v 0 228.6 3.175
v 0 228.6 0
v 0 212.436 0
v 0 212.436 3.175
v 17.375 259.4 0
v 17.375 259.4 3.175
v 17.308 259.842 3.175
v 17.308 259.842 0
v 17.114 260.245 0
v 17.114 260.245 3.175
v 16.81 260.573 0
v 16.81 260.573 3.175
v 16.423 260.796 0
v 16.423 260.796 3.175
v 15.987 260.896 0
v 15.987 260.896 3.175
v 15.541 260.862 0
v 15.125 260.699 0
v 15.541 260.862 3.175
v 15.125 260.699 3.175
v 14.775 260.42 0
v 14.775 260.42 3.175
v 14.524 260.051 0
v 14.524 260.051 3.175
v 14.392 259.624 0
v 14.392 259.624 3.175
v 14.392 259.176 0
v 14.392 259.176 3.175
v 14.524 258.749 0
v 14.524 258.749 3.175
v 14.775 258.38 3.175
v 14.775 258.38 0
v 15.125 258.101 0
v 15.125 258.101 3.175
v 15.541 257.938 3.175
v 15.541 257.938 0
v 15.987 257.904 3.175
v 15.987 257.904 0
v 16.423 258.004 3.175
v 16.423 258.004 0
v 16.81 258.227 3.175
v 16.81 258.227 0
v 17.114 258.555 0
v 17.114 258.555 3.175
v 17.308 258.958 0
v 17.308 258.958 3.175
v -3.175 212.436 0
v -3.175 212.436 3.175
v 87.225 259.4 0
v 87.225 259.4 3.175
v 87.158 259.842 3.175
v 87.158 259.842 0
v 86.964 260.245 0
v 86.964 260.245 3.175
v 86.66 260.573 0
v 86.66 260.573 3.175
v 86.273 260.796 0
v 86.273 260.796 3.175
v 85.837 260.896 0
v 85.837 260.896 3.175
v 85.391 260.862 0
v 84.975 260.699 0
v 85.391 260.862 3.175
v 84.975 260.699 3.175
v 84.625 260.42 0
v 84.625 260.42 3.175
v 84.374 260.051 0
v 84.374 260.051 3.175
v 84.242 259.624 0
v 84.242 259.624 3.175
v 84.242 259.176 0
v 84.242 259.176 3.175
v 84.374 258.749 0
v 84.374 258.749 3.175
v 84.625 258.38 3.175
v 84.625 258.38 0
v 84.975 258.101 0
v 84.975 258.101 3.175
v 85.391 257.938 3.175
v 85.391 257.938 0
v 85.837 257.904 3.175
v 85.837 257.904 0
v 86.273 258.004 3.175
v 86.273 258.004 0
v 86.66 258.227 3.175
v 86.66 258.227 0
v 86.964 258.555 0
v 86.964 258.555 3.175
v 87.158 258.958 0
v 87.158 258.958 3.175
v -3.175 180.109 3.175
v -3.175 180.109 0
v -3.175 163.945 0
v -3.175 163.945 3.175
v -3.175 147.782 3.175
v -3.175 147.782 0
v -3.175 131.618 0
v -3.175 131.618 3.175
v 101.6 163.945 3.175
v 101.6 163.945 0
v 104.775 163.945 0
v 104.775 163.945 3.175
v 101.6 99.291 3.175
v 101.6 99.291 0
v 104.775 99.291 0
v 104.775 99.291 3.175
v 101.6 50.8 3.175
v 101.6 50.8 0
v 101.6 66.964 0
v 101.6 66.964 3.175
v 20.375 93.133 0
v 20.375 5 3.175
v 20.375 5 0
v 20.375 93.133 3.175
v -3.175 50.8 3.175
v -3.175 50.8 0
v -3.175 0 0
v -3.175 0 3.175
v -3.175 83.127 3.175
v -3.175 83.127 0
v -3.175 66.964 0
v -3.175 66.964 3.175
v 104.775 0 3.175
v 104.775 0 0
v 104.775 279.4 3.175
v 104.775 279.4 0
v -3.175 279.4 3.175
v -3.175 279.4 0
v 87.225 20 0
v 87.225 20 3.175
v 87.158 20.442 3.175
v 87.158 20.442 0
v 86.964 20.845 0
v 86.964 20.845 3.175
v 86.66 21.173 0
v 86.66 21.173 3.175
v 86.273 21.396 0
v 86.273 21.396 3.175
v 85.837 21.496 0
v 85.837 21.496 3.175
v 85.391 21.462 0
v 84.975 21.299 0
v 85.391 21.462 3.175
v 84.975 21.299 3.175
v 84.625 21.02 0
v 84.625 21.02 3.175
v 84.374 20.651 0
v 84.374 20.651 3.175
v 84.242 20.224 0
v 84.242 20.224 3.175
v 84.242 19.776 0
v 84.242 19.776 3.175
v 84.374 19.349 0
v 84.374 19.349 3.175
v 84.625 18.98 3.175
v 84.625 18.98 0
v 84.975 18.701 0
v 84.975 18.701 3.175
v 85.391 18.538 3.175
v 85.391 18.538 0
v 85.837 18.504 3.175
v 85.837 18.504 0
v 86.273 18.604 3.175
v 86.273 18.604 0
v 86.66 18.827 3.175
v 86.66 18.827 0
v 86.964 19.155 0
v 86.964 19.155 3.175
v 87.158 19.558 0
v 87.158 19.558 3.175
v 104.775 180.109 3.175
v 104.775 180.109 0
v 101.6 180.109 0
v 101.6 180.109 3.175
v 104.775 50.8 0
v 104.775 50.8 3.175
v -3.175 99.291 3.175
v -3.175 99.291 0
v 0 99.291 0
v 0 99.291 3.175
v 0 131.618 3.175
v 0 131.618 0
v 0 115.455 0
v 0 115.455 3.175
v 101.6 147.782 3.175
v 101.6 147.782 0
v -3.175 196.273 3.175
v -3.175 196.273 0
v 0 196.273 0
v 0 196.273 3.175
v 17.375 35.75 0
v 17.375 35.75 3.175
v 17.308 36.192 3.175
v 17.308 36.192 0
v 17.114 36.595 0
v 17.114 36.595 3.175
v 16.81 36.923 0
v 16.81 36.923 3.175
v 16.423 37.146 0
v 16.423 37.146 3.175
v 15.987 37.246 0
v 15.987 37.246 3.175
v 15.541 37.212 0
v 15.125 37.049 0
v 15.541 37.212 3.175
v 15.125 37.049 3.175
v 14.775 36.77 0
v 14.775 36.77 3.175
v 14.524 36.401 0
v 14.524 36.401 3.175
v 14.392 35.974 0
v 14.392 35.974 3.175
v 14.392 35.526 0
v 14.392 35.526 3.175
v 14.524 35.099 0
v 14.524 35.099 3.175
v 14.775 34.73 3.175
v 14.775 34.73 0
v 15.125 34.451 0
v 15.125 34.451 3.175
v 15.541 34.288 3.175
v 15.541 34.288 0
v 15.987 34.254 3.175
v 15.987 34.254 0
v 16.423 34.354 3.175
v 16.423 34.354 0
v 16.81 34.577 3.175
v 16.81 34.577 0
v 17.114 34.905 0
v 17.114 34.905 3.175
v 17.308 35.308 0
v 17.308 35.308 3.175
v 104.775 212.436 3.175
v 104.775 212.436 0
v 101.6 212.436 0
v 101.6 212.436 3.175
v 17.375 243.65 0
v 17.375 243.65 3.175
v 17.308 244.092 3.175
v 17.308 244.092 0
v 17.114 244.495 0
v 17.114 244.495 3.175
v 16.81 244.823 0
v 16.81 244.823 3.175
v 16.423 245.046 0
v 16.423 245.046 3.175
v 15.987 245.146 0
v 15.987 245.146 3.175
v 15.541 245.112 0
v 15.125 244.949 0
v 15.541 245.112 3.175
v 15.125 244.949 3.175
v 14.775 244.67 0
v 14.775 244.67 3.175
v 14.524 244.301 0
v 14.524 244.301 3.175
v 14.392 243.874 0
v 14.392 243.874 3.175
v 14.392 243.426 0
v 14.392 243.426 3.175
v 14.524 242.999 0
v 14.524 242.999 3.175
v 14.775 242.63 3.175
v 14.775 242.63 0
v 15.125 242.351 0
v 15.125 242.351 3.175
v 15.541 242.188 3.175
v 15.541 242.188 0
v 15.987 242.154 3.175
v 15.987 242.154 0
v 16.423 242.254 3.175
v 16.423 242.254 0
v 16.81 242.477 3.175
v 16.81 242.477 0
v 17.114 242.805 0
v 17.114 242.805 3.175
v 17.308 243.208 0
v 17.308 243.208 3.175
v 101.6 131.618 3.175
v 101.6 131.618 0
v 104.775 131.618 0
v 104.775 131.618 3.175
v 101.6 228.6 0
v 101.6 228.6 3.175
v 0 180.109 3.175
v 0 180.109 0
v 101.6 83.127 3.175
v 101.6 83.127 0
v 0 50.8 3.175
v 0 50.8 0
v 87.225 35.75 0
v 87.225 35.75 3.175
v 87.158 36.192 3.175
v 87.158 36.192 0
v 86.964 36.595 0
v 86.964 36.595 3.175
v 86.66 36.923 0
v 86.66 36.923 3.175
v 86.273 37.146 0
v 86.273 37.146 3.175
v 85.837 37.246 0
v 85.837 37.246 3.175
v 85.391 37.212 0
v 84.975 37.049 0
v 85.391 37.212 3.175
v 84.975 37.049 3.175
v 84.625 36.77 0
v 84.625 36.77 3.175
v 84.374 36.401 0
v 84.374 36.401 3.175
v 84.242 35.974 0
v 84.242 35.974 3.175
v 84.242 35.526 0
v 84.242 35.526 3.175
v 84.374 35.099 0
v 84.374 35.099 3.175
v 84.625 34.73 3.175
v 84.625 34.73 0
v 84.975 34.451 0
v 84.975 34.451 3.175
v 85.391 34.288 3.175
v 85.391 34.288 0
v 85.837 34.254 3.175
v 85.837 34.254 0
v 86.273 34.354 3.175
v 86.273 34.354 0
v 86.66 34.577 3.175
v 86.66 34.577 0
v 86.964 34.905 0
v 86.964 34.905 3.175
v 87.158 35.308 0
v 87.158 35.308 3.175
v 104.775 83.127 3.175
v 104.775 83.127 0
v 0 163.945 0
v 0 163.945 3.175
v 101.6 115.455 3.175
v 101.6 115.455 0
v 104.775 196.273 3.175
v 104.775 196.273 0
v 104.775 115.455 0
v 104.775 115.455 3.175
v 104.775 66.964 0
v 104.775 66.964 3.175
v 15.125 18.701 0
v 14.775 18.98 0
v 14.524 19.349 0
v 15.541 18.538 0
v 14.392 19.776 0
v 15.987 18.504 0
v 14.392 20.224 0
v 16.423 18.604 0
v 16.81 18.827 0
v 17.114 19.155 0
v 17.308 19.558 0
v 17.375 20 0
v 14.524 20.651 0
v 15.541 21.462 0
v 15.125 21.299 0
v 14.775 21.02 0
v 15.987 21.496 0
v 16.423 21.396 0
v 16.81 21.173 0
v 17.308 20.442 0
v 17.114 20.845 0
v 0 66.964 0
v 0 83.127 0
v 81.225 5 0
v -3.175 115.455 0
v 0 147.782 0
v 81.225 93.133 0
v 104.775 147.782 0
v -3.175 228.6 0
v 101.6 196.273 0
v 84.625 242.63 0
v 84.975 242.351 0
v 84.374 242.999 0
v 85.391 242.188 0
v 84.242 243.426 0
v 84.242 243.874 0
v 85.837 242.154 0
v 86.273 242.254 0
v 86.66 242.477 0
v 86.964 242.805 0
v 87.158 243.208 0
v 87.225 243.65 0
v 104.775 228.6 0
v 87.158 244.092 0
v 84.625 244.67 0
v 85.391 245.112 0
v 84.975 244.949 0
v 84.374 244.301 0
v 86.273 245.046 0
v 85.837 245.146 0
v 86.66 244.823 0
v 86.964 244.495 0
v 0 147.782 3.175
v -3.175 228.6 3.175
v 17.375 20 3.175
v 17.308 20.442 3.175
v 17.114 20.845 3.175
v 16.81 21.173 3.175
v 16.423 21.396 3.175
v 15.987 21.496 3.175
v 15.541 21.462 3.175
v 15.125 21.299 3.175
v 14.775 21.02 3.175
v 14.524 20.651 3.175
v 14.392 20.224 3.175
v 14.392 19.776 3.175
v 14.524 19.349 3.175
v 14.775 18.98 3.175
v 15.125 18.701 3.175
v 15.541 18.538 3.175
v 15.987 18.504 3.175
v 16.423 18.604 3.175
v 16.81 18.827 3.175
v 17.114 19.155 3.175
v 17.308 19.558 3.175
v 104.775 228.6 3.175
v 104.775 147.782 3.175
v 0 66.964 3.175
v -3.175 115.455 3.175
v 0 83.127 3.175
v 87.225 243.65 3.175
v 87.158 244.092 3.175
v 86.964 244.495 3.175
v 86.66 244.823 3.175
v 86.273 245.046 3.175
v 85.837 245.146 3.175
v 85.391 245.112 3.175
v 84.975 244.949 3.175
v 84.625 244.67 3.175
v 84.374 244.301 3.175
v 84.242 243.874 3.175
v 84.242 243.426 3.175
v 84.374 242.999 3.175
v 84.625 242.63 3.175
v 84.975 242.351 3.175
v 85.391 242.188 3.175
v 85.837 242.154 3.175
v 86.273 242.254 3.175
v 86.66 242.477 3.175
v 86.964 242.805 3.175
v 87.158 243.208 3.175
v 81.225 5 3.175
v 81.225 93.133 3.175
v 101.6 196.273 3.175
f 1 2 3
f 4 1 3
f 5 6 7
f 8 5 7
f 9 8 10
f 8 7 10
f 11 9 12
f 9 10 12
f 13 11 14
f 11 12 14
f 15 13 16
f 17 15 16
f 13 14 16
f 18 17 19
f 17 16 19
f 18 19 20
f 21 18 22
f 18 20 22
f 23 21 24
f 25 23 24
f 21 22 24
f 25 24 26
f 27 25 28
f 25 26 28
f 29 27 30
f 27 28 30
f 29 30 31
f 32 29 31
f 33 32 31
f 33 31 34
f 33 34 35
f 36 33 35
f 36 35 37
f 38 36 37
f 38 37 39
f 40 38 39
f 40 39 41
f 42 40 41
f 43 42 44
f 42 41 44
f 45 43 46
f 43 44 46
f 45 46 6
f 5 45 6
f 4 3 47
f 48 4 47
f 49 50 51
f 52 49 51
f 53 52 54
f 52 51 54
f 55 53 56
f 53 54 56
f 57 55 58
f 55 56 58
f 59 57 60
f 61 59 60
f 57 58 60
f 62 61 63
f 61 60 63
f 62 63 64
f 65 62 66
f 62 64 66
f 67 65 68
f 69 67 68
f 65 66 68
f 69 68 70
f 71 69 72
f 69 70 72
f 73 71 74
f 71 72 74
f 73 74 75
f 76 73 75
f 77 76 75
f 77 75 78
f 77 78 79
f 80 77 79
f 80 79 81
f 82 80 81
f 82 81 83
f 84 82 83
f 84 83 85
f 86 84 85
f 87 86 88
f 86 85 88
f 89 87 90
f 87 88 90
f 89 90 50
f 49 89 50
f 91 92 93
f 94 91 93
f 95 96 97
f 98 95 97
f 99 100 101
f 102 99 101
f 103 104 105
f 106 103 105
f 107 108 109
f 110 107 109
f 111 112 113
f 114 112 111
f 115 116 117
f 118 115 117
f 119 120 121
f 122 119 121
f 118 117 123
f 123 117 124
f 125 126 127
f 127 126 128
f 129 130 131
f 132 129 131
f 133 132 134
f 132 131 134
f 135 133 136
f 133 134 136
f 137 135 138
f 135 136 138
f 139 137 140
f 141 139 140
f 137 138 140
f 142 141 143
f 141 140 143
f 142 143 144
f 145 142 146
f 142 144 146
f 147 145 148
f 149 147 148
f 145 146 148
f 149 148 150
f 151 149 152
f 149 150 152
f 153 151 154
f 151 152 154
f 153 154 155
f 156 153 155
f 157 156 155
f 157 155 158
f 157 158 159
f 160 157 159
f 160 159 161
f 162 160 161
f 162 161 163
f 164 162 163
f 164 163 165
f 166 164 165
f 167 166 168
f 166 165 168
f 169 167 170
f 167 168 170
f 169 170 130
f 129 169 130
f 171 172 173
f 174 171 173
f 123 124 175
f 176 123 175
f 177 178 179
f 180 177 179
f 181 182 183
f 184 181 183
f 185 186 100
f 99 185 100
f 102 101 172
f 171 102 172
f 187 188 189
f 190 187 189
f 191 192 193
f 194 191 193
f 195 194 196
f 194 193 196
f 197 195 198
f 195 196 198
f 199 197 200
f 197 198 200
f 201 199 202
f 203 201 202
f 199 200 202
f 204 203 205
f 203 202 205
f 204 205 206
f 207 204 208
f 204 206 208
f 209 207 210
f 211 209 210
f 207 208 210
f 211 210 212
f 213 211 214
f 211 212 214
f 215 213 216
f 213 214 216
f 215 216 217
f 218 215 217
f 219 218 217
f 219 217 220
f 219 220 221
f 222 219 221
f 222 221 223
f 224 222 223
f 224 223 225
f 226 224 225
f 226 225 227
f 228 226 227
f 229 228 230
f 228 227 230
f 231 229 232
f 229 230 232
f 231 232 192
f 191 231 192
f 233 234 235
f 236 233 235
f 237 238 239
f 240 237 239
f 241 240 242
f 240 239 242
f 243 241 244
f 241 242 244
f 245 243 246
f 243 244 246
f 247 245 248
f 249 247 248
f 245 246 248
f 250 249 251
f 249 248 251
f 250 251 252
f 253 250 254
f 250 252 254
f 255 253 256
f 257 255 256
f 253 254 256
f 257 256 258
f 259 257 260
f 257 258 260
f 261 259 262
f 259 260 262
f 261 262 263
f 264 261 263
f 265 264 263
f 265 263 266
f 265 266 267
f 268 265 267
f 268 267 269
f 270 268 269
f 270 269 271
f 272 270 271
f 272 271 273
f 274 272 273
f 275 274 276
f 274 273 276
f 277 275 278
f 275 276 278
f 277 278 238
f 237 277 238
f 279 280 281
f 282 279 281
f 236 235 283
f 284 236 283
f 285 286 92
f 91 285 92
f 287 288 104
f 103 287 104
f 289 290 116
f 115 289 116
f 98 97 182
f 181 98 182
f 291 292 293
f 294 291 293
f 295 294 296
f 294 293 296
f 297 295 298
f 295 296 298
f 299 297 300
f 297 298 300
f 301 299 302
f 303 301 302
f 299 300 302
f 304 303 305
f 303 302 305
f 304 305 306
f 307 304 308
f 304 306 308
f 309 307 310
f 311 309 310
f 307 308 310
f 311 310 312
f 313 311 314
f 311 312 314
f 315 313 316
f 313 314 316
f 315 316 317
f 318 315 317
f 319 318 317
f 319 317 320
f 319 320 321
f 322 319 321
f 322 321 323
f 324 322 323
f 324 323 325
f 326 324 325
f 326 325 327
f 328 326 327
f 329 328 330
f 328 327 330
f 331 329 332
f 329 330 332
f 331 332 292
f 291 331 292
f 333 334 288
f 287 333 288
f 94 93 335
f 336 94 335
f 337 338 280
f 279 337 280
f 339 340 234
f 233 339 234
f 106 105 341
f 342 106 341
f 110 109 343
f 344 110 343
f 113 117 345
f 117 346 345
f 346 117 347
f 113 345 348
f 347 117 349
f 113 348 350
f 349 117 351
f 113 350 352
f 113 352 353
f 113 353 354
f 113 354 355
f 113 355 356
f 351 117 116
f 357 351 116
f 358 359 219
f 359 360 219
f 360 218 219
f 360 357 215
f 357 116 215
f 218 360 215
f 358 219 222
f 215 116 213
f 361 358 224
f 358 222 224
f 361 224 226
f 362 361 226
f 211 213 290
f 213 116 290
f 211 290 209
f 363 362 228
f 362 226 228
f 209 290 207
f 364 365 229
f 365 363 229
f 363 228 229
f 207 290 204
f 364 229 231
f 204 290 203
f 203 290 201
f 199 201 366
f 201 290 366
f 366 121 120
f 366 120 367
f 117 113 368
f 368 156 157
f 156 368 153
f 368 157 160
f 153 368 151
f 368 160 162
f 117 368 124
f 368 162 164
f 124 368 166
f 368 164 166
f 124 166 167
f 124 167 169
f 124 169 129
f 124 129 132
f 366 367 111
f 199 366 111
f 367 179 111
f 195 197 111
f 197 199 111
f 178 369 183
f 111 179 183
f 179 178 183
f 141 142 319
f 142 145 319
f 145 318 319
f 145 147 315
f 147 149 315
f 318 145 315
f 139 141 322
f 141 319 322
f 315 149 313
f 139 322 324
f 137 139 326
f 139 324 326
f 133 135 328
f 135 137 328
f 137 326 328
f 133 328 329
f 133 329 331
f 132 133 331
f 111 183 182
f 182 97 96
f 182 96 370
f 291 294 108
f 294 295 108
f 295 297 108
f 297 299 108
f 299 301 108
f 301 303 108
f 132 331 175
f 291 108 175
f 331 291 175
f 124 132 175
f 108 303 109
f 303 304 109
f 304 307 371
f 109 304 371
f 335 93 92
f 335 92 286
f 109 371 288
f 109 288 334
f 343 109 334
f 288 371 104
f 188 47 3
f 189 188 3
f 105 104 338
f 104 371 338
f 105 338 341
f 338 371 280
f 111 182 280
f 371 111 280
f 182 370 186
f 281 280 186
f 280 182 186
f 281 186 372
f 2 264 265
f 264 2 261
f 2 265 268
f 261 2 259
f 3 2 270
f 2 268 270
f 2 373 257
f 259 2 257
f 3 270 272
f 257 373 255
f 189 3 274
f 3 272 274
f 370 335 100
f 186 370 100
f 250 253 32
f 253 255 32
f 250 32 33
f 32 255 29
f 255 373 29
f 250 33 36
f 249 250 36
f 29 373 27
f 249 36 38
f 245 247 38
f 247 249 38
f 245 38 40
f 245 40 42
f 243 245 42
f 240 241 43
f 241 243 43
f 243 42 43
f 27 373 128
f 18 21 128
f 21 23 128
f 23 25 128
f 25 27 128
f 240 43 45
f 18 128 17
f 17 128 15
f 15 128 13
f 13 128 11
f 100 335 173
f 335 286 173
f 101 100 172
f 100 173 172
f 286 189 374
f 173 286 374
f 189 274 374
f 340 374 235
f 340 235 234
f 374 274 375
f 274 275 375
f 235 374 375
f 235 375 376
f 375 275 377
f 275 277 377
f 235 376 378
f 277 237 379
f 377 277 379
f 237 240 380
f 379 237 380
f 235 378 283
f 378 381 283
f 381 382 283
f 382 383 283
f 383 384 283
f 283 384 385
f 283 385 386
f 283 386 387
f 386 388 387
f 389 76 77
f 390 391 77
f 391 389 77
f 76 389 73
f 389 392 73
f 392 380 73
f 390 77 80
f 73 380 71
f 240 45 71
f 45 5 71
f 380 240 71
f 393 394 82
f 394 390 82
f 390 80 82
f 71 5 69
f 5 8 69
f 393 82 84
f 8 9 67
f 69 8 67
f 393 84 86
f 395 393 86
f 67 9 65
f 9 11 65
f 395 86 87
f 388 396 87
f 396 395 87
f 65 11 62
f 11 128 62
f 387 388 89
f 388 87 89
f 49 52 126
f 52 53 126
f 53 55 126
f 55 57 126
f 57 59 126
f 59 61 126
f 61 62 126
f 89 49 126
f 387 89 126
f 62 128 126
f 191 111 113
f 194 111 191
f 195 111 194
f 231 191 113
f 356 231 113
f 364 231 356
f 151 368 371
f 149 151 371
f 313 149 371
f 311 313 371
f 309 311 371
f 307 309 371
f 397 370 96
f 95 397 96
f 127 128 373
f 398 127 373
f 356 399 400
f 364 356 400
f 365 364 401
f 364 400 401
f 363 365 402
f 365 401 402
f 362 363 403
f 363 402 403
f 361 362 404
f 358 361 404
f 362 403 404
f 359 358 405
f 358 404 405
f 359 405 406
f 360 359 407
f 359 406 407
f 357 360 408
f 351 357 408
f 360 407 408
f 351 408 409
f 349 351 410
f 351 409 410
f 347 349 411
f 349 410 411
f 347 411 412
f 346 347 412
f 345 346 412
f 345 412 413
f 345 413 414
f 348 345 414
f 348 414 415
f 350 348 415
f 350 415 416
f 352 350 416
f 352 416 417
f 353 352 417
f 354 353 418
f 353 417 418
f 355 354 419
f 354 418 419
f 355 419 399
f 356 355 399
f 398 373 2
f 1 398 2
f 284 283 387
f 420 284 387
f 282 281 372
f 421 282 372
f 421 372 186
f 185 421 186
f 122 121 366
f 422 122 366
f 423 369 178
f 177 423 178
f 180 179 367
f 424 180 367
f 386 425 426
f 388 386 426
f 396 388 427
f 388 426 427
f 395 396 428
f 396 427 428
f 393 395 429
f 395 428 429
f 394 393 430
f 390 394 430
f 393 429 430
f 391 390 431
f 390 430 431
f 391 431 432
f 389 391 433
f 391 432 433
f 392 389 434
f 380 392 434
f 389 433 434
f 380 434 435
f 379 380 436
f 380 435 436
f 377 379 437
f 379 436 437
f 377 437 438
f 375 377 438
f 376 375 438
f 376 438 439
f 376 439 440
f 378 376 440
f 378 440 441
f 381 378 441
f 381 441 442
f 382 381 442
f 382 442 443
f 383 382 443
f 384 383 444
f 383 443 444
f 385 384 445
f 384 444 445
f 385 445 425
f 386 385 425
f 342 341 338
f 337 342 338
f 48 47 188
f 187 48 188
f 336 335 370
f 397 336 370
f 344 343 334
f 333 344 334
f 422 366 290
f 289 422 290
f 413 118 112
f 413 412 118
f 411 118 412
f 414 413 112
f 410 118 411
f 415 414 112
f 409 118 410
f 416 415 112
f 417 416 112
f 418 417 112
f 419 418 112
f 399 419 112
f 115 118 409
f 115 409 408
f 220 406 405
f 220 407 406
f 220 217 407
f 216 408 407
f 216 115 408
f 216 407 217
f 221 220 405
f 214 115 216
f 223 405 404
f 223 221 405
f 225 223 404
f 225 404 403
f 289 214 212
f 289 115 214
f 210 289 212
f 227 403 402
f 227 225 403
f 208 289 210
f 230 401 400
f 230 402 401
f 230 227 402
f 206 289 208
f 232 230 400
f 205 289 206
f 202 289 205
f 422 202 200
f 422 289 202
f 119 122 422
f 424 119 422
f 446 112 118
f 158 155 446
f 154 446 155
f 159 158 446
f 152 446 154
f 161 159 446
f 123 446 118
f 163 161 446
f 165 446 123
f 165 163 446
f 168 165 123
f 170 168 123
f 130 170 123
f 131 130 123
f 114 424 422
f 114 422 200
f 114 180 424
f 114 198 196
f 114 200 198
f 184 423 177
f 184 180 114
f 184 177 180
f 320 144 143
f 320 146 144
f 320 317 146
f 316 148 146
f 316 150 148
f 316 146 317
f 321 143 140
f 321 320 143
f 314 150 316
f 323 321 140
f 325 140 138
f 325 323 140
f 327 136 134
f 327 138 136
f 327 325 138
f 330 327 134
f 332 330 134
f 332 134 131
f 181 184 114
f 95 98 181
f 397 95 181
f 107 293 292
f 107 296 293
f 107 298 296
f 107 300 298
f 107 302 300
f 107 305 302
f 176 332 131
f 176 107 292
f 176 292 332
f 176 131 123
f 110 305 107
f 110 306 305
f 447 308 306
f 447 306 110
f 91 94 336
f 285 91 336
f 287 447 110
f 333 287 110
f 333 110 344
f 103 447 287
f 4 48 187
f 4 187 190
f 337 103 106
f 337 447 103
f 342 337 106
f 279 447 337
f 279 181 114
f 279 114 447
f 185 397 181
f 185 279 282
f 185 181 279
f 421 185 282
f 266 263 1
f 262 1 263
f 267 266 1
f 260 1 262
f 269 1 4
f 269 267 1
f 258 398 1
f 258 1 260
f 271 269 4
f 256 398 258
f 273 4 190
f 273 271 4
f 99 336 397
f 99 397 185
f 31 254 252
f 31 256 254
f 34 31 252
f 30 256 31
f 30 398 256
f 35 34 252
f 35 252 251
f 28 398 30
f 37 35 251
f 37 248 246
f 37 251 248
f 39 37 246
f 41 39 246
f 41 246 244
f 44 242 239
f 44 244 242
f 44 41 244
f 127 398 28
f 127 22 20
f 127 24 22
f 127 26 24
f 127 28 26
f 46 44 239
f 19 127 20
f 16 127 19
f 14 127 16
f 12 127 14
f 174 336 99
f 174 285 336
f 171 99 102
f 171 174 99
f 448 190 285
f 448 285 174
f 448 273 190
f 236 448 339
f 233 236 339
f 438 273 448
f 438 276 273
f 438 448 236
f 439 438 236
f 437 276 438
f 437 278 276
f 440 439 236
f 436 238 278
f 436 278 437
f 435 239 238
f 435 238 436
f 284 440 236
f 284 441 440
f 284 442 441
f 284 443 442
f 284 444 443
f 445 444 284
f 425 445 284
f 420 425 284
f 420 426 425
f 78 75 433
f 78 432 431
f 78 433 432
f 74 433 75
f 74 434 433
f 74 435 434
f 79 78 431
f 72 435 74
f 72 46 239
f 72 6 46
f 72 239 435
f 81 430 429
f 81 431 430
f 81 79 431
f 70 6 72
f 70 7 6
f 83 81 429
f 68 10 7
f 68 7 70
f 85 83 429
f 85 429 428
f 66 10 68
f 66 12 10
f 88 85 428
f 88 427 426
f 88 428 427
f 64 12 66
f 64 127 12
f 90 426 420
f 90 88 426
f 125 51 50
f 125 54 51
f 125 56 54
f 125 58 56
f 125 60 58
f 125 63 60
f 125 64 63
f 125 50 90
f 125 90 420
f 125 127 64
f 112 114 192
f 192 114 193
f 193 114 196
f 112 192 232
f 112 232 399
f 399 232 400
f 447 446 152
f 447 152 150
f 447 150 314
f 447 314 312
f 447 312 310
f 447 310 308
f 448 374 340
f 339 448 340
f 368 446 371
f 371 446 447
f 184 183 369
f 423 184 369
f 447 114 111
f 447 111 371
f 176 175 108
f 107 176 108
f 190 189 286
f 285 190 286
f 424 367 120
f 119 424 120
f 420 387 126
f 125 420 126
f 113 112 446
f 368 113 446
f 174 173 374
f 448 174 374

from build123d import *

# Parameters (mm, degrees)
BOSS_EXTRUDE1_DEPTH = 3.175
SKETCH2_R           = 1.5
CUT_EXTRUDE1_DEPTH  = 3.175
SKETCH3_W           = 60.85
SKETCH3_H           = 88.133333333
CUT_EXTRUDE2_DEPTH  = 3.175


with BuildPart() as part:
    # Sketch1 → Boss-Extrude1 (new body)
    with BuildSketch(Plane.XY):
        Polygon((-3.175, 279.4), (-3.175, 228.6), (0, 228.6), (0, 212.436363636), (-3.175, 212.436363636), (-3.175, 196.272727273), (0, 196.272727273), (0, 180.109090909), (-3.175, 180.109090909), (-3.175, 163.945454545), (0, 163.945454545), (0, 147.781818182), (-3.175, 147.781818182), (-3.175, 131.618181818), (0, 131.618181818), (0, 115.454545455), (-3.175, 115.454545455), (-3.175, 99.290909091), (0, 99.290909091), (0, 83.127272727), (-3.175, 83.127272727), (-3.175, 66.963636364), (0, 66.963636364), (0, 50.8), (-3.175, 50.8), (-3.175, 0), (104.775, 0), (104.775, 50.8), (101.6, 50.8), (101.6, 66.963636364), (104.775, 66.963636364), (104.775, 83.127272727), (101.6, 83.127272727), (101.6, 99.290909091), (104.775, 99.290909091), (104.775, 115.454545455), (101.6, 115.454545455), (101.6, 131.618181818), (104.775, 131.618181818), (104.775, 147.781818182), (101.6, 147.781818182), (101.6, 163.945454545), (104.775, 163.945454545), (104.775, 180.109090909), (101.6, 180.109090909), (101.6, 196.272727273), (104.775, 196.272727273), (104.775, 212.436363636), (101.6, 212.436363636), (101.6, 228.6), (104.775, 228.6), (104.775, 279.4), align=None)
    extrude(amount=BOSS_EXTRUDE1_DEPTH)

    # Sketch2 → Cut-Extrude1 (cut)
    with BuildSketch(Plane.XY.offset(3.175)):
        with Locations((15.875, 20)):
            Circle(SKETCH2_R)
        with Locations((15.875, 35.75)):
            Circle(SKETCH2_R)
        with Locations((15.875, 243.65)):
            Circle(SKETCH2_R)
        with Locations((15.875, 259.4)):
            Circle(SKETCH2_R)
        with Locations((85.725, 259.4)):
            Circle(SKETCH2_R)
        with Locations((85.725, 243.65)):
            Circle(SKETCH2_R)
        with Locations((85.725, 35.75)):
            Circle(SKETCH2_R)
        with Locations((85.725, 20)):
            Circle(SKETCH2_R)
    extrude(amount=-CUT_EXTRUDE1_DEPTH, mode=Mode.SUBTRACT)

    # Sketch3 → Cut-Extrude2 (cut)
    with BuildSketch(Plane.XY.offset(3.175)):
        with Locations((50.8, 49.066666667)):
            Rectangle(SKETCH3_W, SKETCH3_H)
    extrude(amount=-CUT_EXTRUDE2_DEPTH, mode=Mode.SUBTRACT)


solid = part.part
